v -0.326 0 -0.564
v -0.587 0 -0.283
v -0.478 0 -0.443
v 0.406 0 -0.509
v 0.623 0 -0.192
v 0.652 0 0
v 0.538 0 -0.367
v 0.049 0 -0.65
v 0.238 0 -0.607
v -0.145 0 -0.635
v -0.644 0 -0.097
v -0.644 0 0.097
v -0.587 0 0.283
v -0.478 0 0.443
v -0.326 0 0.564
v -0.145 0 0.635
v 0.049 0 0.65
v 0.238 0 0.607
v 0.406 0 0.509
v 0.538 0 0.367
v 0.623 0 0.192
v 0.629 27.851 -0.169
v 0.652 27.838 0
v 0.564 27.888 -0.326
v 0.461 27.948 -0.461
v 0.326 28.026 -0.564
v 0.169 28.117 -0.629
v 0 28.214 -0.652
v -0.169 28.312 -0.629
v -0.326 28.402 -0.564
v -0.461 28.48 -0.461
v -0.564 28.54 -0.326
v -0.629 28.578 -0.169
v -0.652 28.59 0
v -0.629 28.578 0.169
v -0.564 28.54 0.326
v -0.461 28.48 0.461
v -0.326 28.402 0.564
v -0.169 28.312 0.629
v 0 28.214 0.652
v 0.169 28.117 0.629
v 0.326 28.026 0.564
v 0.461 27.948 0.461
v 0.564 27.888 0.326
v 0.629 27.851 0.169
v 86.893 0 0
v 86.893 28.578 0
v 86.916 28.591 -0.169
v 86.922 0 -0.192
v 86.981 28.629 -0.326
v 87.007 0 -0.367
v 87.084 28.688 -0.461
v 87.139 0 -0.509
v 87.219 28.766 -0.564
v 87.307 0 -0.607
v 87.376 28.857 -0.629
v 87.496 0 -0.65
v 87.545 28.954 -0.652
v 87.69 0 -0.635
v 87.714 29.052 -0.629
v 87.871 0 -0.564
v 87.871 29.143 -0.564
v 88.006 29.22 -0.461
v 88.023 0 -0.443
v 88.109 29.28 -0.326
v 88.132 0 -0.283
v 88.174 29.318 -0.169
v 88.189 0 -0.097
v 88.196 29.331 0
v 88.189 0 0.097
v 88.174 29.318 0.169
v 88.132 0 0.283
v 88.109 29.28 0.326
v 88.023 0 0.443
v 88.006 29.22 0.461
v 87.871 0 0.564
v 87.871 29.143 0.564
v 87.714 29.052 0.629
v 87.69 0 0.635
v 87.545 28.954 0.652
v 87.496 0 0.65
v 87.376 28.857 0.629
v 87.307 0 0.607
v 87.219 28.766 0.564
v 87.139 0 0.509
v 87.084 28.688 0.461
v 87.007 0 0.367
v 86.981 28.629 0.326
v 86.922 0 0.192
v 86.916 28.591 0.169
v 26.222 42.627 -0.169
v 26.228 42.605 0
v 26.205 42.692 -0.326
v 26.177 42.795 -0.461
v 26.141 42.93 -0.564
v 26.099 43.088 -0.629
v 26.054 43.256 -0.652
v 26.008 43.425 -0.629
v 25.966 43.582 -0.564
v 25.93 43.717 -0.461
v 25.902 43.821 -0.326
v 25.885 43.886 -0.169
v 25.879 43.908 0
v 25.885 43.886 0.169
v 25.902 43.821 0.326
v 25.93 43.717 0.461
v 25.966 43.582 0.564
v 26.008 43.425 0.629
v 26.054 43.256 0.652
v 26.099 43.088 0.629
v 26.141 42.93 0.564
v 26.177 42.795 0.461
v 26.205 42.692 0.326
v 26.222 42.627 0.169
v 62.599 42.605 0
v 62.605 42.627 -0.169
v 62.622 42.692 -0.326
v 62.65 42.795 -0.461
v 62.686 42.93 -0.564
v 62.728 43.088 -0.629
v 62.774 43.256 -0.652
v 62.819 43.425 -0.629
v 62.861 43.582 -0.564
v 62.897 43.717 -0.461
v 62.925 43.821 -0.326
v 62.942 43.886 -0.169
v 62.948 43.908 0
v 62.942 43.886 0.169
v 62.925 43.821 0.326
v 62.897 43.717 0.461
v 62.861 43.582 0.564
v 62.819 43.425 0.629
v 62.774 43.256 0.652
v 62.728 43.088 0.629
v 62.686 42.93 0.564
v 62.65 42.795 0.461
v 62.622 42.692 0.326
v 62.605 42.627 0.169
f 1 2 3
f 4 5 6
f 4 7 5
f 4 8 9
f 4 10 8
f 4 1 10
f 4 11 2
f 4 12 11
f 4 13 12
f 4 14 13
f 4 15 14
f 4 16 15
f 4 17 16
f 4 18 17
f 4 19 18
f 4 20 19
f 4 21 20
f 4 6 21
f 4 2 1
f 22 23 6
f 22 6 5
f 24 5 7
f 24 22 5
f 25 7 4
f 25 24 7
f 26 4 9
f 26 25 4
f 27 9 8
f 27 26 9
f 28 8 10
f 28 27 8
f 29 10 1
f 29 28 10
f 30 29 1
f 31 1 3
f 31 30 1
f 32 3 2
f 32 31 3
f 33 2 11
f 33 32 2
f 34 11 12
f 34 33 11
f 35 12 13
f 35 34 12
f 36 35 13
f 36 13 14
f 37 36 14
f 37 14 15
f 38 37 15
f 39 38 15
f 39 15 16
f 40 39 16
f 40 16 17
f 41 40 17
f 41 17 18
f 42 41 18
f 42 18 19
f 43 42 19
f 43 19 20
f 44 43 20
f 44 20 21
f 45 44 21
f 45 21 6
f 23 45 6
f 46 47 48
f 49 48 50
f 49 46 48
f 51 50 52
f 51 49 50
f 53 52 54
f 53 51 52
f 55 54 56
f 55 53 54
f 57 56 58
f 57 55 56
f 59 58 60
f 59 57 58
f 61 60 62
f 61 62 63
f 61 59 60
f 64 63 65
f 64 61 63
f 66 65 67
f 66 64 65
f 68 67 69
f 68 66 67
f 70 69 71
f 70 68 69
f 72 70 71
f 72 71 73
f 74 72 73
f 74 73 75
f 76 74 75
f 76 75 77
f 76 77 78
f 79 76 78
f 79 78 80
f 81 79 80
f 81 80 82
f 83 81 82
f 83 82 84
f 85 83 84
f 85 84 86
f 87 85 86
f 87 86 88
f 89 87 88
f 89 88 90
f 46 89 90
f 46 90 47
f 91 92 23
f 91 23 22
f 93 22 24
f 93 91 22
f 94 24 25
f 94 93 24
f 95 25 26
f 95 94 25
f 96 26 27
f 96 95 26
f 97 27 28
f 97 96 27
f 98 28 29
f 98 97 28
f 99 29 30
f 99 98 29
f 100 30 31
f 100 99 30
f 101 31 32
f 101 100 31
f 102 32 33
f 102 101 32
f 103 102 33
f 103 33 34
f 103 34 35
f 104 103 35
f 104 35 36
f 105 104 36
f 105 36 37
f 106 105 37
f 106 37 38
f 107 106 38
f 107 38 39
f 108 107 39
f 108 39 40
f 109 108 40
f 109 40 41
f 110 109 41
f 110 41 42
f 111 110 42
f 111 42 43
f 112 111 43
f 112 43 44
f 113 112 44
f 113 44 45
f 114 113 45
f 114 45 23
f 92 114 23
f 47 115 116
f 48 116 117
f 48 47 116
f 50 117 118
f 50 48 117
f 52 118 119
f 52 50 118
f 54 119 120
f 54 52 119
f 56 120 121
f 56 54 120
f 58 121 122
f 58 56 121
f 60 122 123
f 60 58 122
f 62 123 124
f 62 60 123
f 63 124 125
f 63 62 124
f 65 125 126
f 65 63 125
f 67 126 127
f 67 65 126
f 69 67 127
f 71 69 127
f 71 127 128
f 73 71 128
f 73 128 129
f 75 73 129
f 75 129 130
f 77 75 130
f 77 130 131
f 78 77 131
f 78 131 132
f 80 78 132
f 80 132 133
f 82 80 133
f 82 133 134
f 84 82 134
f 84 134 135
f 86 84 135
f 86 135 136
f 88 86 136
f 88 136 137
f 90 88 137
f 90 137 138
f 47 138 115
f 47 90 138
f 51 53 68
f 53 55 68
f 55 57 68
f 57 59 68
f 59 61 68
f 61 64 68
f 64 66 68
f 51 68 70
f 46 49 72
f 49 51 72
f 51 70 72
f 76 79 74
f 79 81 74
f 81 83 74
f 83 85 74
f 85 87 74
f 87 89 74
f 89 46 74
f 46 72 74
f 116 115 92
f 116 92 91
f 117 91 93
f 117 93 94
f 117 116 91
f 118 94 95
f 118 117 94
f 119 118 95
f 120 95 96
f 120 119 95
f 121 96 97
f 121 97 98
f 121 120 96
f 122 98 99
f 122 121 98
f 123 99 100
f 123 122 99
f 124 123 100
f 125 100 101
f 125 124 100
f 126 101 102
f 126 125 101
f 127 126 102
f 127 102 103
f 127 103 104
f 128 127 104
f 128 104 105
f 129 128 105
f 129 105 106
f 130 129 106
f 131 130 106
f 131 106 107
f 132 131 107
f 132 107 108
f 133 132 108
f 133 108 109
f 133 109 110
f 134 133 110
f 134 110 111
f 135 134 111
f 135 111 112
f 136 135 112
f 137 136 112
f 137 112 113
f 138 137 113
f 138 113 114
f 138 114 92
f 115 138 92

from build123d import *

# Parameters (mm, degrees)
F1_R = 0.6515882549


with BuildPart() as f2:
    # F2: sweep along a path in F0
    with BuildLine(Plane.XY) as f2_path:
        Line((0, 0), (0, 28.2141789794))
        Line((0, 28.2141789794), (26.0536126347, 43.2562392474))
        Line((26.0536126347, 43.2562392474), (62.7735159846, 43.2562392474))
        Line((62.7735159846, 43.2562392474), (87.544889414, 28.9544801298))
        Line((87.544889414, 28.9544801298), (87.544889414, 0))
    # F1 (on Front) → F2 (sweep)
    with BuildSketch(Plane.XZ):
        Circle(F1_R)
    sweep(path=f2_path.line, transition=Transition.RIGHT)


solid = f2.part
